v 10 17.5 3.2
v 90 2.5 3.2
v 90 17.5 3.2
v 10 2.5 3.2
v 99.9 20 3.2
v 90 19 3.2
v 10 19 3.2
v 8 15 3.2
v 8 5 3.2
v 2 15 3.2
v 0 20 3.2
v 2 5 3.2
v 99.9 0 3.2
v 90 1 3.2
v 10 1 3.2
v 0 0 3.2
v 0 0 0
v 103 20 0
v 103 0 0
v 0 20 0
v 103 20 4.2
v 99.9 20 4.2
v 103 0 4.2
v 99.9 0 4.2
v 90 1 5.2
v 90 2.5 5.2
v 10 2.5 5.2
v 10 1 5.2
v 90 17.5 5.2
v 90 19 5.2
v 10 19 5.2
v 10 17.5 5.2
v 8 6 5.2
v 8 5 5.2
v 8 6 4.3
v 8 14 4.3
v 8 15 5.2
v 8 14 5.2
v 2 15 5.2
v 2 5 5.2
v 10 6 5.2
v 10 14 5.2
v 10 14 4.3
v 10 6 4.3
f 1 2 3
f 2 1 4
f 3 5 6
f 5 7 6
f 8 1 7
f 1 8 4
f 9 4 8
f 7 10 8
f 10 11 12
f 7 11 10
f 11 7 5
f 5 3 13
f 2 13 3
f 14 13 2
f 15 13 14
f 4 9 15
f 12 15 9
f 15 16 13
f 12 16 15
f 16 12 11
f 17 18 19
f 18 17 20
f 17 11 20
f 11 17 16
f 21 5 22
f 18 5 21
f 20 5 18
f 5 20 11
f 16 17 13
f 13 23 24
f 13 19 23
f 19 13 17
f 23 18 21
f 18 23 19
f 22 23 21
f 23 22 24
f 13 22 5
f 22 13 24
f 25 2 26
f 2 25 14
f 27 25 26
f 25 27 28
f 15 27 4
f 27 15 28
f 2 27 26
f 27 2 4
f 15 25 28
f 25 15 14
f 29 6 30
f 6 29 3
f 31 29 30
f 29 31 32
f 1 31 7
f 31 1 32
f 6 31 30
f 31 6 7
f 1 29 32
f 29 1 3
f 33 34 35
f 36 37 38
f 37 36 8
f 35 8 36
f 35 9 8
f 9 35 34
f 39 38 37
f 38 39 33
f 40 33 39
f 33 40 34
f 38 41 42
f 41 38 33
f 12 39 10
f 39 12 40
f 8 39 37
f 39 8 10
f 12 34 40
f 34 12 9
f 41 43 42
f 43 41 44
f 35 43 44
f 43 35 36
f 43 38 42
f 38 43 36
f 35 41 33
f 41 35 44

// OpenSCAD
// Bag clip with living hinge - PETG, 0.4mm nozzle, no supports
// Printed open flat (two arms end-to-end), closes by folding 180deg about Y.
// Lower arm at origin, upper arm local origin at its hinge edge.

part = "arm_lower"; // [arm_lower, arm_upper, assembly]
cadverify_only = "";

/* Dimensions (mm) */
Lbody = 100;      // arm body length
Wbody = 20;       // arm width
Tbody = 3.2;      // arm thickness
Hhinge = 6;       // total hinge length (gap between bodies)
Hhalf = 3;        // hinge half length per arm
Thinge = 0.6;     // hinge thickness
Bgap = 2.0;       // bag thickness / closed gap
Ttot = Tbody + Bgap; // 5.2 closed inner top
Zpiv = Tbody + Bgap/2; // 4.2 pivot height
Xpiv = Lbody + Hhalf;  // 103 pivot X in assembly

module instance(name, part, unit = 1) {
    echo(cadverify_instance = [name, part, unit]);
    if (cadverify_only == "" || cadverify_only == name) children();
}

// ---------- lower arm geometry (print orientation, min at 0) ----------
module arm_lower() {
    // body
    cube([Lbody, Wbody, Tbody], false);
    // hinge half (thin, on bed), overlap 0.1 into body
    translate([Lbody-0.1, 0, 0])
        cube([Hhalf+0.1, Wbody, Thinge], false);
    // hinge heel (close stop), overlap into body
    translate([Lbody-0.1, 0, Thinge-0.1])
        cube([Hhalf+0.1, Wbody, Zpiv-Thinge+0.1], false);
    // ribs (2mm tall standoff), overlap 0.1 into body
    translate([10, 1, Tbody-0.1])
        cube([80, 1.5, Bgap+0.1], false);
    translate([10, 17.5, Tbody-0.1])
        cube([80, 1.5, Bgap+0.1], false);
    // latch tower, overlap into body
    translate([2, 5, Tbody-0.1])
        cube([6, 10, Bgap+0.1], false);
    // latch lip (cantilever +X), overlap into tower
    translate([7.9, 6, 4.3])
        cube([2.1, 8, 0.9], false);
}

// ---------- upper arm geometry (print orientation, hinge at x=0) ----------
module arm_upper() {
    // hinge half on bed
    cube([Hhalf+0.1, Wbody, Thinge], false);
    // body, overlap into hinge
    translate([Hhalf-0.1, 0, 0])
        cube([Lbody+0.1, Wbody, Tbody], false);
    // latch tower (maps to closed x=12-18), overlap into body
    translate([85, 5, Tbody-0.1])
        cube([6, 10, Bgap+0.1], false);
    // latch lip (extends +X toward free end), overlap into tower
    translate([91, 6, 4.2])
        cube([2.8, 8, 1.0], false);
    // thumb tab beyond free end, same thickness as body, overlap
    translate([102.9, 6, 0])
        cube([8.1, 8, Tbody], false);
}

// ---------- part / assembly dispatch ----------
if (part == "arm_lower") {
    echo(cadverify_spec = [
        ["bounds", [[0, 0, 0], [103, 20, 5.2]]],
        ["bodies", 1],
        ["through_holes", 0],
        ["support_faces", [["bed", "-z", 1500]]],
        ["overhangs_allowed", [["latch lip", [[7.5, 5.5, 4.0], [10.5, 14.5, 5.5]]]]],
        ["copies", 1],
        ["details", [
            ["arm", "material", [[10, 5, 0.5], [90, 15, 2.7]], 0.95],
            ["arm_wall", "thickness", [50, 10, 10], [0, 0, -1], 3.2],
            ["hinge", "thickness", [101.5, 10, 5], [0, 0, -1], 0.6],
            ["rib", "material", [[20, 1.2, 3.5], [80, 2.3, 5.0]], 1],
            ["latch_tower", "material", [[3, 6, 3.5], [7, 14, 5.0]], 1],
            ["latch_lip", "material", [[8.5, 7, 4.5], [9.5, 13, 5.0]], 0.95],
            ["bag_slot", "void", [[20, 3, 3.5], [80, 17, 5.0]], 0.95]
        ]]
    ]);
    arm_lower();
} else if (part == "arm_upper") {
    echo(cadverify_spec = [
        ["bounds", [[0, 0, 0], [111, 20, 5.2]]],
        ["bodies", 1],
        ["through_holes", 0],
        ["support_faces", [["bed", "-z", 1500]]],
        ["overhangs_allowed", [["latch lip", [[90.5, 5.5, 4.0], [94.5, 14.5, 5.5]]]]],
        ["copies", 1],
        ["details", [
            ["arm", "material", [[10, 5, 0.5], [80, 15, 2.7]], 1],
            ["arm_wall", "thickness", [50, 10, 10], [0, 0, -1], 3.2],
            ["hinge", "thickness", [1.5, 10, 5], [0, 0, -1], 0.6],
            ["latch_tower", "material", [[86, 6, 3.5], [90, 14, 5.0]], 1],
            ["latch_lip", "material", [[91.5, 7, 4.4], [93.5, 13, 5.0]], 1],
            ["thumb_tab", "material", [[104, 7, 0.5], [110, 13, 2.7]], 1],
            ["field", "void", [[10, 3, 3.5], [80, 17, 5.0]], 1]
        ]]
    ]);
    arm_upper();
} else if (part == "assembly") {
    echo(cadverify_spec = [
        ["bounds", [[0, 0, 0], [214, 20, 5.2]]],
        ["support_faces", [["bed", "-z", 3000]]],
        ["motions", [
            ["close", ["upper"], "rotate", [103, 10, 4.2], [0, -1, 0], [0, 180],
                ["flex", [["upper", "lower", 1.0, "latch snap"]]],
                ["stops", [180]]
            ]
        ]],
        ["assembly_order", [
            [["lower"], [0, 0, 0]],
            [["upper"], [0, 0, -1]]
        ]]
    ]);
    instance("lower", "arm_lower") arm_lower();
    instance("upper", "arm_upper") translate([103, 0, 0]) arm_upper();
}
